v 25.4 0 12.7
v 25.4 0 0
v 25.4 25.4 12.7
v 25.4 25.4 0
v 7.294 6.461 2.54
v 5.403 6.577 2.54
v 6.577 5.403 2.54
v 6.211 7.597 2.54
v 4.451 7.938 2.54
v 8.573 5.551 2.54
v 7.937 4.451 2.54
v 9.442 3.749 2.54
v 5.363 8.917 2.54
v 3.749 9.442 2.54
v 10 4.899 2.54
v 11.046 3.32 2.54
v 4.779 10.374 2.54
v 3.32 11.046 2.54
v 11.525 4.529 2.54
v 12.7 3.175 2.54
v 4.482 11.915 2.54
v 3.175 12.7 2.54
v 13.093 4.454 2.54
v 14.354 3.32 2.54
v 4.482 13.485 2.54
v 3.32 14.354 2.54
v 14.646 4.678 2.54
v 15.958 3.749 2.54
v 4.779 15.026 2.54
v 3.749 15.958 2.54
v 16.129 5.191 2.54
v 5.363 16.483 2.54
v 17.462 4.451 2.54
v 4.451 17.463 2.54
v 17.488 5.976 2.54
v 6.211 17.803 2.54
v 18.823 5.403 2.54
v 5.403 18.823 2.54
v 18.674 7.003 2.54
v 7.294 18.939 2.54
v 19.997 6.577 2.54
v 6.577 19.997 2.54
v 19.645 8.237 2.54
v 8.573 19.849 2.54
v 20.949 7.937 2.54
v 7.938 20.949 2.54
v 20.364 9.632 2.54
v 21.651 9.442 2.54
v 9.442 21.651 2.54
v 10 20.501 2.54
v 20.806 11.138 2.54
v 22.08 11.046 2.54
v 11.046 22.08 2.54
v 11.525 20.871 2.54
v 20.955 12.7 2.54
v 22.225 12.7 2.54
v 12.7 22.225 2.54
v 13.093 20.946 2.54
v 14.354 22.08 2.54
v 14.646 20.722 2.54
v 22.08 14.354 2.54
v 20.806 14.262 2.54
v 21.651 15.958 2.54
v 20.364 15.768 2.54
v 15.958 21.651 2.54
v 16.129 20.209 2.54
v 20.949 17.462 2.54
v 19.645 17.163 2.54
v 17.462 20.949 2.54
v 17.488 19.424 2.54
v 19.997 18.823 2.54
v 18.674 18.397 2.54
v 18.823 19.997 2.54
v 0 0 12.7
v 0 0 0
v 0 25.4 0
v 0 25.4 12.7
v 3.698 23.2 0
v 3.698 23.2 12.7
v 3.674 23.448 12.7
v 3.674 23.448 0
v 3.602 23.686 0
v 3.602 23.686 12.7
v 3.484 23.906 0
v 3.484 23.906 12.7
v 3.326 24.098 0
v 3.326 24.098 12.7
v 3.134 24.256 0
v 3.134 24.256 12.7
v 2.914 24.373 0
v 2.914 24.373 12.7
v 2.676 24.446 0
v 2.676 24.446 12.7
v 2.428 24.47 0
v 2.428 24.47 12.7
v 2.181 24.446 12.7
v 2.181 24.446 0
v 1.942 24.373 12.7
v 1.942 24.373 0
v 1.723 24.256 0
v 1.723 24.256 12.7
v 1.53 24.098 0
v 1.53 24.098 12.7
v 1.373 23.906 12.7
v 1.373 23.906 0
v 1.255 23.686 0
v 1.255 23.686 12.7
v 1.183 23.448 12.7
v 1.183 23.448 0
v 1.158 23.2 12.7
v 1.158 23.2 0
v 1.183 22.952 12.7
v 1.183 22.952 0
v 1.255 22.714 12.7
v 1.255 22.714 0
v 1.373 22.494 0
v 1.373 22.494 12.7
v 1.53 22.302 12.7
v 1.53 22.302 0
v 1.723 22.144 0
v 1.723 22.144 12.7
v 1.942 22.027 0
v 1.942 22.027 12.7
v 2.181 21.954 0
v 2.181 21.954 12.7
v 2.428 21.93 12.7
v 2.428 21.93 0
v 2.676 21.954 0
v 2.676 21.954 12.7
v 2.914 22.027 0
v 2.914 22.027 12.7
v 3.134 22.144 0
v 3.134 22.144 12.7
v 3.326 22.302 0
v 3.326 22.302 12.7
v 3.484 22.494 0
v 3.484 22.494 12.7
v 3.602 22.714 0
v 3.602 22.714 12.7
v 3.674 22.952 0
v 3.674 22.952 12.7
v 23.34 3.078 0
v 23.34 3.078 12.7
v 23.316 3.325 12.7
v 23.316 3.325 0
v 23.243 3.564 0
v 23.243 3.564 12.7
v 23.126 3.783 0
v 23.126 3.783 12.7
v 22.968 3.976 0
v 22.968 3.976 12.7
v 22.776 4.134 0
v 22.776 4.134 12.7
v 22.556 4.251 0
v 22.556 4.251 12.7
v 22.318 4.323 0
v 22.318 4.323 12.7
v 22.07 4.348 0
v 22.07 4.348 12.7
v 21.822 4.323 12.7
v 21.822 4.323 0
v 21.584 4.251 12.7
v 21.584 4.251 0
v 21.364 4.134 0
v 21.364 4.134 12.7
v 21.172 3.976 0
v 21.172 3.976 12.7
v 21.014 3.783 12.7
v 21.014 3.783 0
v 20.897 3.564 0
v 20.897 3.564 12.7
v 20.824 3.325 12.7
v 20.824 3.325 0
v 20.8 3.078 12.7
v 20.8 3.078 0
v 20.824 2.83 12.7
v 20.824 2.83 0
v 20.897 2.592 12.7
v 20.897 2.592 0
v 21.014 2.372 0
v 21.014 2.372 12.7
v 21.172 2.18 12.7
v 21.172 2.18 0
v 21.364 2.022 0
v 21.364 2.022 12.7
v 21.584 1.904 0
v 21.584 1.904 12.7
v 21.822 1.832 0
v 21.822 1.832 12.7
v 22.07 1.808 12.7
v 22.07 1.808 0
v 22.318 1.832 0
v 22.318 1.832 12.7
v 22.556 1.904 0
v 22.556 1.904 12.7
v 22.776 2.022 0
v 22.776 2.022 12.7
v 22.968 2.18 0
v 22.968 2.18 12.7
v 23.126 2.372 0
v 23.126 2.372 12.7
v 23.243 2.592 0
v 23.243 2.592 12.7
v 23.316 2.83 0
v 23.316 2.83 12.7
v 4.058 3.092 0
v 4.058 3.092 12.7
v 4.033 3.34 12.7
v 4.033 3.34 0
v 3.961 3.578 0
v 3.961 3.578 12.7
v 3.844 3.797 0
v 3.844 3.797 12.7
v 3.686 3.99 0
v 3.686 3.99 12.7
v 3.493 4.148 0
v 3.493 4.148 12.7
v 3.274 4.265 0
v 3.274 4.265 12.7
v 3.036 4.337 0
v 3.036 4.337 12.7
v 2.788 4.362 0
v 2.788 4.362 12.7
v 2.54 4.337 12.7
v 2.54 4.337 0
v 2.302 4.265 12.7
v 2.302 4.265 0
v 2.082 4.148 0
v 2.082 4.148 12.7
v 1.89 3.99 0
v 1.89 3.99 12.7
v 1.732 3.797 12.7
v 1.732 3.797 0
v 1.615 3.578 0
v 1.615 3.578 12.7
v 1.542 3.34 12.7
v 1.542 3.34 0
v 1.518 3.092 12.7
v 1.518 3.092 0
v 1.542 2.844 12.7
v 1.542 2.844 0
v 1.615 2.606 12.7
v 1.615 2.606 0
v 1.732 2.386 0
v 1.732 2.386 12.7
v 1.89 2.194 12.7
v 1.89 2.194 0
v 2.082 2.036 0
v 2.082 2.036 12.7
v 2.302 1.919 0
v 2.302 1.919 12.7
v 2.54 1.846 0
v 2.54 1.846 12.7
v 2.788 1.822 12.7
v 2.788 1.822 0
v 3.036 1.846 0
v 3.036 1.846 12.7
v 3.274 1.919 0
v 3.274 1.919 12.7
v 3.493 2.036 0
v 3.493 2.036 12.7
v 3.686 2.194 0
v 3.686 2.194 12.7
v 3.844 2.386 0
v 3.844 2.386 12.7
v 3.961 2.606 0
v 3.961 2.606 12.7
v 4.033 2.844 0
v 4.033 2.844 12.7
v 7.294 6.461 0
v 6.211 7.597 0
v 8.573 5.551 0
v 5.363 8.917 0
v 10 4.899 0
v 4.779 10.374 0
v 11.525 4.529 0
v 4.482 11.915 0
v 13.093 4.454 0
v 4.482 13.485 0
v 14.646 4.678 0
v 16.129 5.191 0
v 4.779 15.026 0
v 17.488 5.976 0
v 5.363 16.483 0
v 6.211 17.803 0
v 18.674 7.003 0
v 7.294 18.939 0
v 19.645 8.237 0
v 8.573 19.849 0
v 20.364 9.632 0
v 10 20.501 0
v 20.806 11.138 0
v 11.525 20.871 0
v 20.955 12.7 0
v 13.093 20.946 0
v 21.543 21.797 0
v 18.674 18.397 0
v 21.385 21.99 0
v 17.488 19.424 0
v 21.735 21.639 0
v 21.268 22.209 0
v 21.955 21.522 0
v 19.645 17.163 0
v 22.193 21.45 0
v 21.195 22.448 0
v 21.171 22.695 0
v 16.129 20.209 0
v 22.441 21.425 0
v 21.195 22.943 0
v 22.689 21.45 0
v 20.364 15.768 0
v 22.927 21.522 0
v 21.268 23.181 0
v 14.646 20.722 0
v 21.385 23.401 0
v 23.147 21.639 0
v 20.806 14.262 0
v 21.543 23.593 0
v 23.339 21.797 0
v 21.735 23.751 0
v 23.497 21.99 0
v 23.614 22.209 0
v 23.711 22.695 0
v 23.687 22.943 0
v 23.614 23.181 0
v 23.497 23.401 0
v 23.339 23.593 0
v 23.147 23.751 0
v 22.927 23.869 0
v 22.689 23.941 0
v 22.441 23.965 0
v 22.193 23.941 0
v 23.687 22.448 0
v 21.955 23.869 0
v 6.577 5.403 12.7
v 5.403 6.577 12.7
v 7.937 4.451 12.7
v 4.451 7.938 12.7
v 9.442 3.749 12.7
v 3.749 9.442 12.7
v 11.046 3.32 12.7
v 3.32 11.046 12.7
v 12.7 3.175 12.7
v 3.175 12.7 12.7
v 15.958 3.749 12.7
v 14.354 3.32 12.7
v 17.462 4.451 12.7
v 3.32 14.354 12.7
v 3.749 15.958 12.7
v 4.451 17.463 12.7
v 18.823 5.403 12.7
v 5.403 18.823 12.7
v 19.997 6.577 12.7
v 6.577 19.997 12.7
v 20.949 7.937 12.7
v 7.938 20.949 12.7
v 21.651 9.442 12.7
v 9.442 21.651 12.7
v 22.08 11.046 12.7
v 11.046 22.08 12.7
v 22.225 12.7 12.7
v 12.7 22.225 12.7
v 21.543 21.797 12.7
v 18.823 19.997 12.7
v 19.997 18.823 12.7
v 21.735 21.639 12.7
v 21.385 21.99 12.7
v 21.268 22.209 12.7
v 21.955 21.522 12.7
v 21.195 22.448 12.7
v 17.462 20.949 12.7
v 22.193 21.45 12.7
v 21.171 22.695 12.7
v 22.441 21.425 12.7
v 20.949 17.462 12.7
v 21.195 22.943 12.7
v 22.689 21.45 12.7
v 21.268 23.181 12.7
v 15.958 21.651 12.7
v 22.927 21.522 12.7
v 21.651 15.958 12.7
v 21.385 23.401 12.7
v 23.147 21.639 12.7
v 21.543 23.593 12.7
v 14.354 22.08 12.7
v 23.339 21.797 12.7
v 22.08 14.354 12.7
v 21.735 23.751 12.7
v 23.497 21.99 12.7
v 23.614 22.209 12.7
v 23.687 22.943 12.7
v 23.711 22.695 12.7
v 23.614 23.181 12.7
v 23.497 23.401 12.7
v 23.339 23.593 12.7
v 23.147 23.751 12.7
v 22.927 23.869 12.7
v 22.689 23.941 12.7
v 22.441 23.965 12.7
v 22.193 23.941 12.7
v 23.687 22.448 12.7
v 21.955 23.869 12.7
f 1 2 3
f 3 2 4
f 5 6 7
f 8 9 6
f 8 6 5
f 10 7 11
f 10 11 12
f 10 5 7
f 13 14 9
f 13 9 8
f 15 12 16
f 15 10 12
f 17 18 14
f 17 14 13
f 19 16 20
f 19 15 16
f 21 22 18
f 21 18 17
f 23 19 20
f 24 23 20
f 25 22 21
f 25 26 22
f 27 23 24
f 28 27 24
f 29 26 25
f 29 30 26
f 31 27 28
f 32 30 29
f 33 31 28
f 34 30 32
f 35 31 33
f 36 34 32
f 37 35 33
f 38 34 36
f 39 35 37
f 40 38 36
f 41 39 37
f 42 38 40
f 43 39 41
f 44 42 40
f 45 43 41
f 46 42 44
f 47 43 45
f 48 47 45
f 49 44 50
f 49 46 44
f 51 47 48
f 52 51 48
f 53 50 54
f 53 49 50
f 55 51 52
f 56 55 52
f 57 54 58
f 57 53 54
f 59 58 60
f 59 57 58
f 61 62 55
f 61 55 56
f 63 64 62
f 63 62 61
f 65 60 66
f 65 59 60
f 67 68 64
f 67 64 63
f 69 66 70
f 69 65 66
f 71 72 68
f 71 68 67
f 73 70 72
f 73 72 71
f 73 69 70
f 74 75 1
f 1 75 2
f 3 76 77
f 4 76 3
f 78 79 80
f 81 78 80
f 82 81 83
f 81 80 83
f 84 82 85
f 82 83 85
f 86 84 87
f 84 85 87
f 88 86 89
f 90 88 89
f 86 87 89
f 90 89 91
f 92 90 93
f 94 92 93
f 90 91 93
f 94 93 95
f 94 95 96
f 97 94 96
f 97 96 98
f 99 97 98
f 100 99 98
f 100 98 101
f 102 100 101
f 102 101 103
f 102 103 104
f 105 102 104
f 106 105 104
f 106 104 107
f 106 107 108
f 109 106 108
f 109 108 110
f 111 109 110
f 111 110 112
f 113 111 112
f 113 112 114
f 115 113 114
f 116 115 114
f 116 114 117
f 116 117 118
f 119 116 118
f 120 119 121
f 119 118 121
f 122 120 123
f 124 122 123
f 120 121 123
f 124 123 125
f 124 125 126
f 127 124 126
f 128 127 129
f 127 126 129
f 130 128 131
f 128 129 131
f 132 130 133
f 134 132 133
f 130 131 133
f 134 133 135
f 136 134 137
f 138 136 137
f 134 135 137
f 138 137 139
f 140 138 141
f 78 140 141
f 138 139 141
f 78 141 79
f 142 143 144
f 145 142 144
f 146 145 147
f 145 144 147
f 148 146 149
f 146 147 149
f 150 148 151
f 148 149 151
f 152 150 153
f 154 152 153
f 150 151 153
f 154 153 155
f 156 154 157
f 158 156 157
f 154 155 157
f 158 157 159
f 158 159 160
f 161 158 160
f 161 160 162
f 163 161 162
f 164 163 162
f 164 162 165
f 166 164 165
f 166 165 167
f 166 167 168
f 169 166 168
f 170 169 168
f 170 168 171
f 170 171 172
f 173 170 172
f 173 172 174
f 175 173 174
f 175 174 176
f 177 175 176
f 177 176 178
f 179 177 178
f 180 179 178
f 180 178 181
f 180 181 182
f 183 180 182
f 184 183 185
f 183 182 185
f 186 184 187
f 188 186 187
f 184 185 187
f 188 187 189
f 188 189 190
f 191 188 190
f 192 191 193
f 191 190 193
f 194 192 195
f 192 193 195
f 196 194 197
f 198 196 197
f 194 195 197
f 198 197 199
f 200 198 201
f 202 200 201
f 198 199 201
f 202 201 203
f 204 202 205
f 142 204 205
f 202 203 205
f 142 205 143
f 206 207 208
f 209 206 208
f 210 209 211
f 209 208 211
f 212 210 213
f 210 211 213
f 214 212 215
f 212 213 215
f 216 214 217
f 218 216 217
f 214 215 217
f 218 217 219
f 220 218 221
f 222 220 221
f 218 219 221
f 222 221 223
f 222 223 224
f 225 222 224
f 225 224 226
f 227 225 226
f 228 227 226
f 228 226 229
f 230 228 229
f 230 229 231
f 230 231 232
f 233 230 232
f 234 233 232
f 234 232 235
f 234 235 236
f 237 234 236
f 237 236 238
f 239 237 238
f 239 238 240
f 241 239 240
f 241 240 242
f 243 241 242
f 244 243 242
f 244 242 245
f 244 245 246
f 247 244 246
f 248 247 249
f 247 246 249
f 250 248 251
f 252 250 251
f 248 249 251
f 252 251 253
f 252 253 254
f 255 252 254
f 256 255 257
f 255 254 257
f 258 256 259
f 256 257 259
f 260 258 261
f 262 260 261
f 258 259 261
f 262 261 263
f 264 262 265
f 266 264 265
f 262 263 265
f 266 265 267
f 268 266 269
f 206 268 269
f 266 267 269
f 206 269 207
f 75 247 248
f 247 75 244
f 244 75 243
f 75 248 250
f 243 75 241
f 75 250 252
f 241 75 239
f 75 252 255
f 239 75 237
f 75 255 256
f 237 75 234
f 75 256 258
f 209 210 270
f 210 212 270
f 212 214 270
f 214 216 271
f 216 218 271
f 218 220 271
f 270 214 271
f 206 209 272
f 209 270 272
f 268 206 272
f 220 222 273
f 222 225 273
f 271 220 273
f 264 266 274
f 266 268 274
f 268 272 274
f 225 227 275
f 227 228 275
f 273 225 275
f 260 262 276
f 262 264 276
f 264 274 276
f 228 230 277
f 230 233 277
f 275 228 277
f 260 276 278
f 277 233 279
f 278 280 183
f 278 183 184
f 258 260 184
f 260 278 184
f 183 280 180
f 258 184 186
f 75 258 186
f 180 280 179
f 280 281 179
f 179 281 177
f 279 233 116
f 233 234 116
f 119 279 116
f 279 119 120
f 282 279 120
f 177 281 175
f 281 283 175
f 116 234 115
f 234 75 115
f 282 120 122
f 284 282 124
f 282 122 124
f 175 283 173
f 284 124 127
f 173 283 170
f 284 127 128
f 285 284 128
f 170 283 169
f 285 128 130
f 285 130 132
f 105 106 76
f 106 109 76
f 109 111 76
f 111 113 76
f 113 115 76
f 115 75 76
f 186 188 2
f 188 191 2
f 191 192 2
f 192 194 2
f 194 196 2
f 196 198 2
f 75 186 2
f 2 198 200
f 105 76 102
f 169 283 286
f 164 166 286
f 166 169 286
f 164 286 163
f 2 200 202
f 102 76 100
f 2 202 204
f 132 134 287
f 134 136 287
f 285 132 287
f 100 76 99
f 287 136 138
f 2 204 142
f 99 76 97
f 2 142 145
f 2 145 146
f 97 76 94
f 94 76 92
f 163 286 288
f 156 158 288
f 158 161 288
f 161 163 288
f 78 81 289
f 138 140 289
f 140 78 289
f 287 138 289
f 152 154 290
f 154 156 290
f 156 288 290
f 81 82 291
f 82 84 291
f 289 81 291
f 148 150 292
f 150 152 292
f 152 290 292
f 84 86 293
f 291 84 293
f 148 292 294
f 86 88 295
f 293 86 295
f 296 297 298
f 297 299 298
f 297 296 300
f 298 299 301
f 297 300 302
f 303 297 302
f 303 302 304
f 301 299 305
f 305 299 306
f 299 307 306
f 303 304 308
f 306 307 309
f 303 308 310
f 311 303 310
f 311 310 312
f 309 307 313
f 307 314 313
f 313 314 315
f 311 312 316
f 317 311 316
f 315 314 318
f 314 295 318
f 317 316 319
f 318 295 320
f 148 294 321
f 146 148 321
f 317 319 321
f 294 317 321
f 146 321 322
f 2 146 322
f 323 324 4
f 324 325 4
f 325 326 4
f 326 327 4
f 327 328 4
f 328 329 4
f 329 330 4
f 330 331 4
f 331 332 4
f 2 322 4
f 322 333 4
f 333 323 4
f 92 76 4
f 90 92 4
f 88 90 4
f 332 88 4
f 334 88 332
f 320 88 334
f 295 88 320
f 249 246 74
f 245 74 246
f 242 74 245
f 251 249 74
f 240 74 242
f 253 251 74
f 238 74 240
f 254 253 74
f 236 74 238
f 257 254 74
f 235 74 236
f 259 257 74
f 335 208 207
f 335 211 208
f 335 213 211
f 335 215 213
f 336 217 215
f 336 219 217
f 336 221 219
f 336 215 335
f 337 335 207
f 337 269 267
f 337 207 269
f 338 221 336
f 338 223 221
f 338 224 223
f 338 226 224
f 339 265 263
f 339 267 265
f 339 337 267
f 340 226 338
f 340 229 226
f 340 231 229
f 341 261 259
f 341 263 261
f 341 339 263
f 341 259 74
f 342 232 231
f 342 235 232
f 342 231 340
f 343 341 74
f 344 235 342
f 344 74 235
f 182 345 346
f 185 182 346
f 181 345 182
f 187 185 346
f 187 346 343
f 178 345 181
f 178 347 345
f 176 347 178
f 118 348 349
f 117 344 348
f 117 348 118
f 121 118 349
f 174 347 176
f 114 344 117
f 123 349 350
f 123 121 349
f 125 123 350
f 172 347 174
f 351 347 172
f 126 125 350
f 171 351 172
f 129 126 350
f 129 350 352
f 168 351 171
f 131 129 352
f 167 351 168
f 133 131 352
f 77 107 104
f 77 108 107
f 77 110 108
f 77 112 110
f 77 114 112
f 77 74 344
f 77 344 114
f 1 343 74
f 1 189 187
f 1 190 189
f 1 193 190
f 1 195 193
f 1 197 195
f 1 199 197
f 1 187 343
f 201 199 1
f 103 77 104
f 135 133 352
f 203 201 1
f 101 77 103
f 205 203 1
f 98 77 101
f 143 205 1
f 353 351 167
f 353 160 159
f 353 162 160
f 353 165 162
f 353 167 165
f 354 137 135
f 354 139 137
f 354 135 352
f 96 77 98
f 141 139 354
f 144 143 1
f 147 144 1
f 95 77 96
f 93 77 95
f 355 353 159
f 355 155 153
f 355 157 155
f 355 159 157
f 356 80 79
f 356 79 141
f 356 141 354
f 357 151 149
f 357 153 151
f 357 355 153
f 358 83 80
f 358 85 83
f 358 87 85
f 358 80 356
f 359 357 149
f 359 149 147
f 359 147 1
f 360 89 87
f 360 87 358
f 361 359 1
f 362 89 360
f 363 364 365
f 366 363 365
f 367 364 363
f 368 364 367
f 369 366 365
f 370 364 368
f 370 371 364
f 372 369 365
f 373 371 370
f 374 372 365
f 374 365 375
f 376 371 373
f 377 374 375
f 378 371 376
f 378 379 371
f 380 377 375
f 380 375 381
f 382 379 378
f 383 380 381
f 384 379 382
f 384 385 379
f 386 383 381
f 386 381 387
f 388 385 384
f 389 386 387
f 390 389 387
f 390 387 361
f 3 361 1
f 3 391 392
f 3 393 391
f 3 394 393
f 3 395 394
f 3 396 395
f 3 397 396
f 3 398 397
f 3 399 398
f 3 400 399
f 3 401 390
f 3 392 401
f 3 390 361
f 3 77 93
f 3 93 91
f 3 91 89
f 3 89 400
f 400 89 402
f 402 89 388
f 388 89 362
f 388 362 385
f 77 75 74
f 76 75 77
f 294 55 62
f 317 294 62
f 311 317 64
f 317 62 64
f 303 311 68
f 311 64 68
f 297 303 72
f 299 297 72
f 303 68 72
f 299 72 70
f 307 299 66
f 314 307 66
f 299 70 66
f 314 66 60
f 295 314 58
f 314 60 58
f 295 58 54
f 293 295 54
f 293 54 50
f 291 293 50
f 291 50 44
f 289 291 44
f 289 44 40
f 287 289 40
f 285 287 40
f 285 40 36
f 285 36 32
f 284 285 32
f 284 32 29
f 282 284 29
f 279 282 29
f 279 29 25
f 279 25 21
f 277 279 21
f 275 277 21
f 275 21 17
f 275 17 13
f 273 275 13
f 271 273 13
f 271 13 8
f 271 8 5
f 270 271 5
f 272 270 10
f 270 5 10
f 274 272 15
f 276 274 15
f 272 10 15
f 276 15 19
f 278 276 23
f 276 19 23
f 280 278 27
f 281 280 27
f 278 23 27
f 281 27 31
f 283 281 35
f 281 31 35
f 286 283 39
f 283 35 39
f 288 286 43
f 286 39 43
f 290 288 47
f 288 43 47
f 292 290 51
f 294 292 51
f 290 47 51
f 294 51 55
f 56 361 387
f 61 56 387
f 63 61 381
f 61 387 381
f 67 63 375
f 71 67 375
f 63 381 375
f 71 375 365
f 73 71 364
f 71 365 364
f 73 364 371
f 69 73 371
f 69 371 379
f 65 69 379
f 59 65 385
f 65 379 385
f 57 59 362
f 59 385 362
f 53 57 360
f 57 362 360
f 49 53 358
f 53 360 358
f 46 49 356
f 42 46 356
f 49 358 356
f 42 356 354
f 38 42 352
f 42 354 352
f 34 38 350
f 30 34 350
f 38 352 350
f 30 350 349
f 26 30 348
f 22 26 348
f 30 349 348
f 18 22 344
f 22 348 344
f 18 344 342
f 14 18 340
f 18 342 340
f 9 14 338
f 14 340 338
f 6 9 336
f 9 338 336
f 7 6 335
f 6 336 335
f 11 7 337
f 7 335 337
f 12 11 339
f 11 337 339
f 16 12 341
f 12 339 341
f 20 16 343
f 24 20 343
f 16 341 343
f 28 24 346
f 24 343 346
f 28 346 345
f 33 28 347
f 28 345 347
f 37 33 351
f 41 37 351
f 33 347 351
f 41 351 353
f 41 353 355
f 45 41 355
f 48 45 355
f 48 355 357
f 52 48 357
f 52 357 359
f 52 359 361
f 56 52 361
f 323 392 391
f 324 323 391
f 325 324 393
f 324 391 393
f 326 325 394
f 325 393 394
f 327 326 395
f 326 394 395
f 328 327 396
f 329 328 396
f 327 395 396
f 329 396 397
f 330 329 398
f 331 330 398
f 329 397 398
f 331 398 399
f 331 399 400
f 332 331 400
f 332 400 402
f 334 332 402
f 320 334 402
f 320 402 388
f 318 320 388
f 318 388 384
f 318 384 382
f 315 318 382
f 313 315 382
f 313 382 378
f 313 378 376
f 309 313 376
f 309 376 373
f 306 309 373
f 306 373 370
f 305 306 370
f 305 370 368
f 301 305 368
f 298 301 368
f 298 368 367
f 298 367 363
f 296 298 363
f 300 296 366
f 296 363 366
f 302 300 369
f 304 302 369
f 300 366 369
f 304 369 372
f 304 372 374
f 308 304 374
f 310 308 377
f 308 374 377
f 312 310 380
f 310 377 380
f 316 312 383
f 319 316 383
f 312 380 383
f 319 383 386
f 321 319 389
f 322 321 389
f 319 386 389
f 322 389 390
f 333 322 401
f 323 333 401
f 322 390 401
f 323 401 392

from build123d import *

# Parameters (mm, degrees)
F0_W      = 25.4
F0_H      = 25.4
F1_DEPTH  = 12.7
F2_R      = 9.525
F3_DEPTH  = 10.16
F4_R      = 8.255
F5_DEPTH  = 2.541
F6_R      = 1.27
F7_DEPTH  = 12.701
F8_R      = 1.27
F9_DEPTH  = 12.701
F10_R     = 1.27
F11_DEPTH = 12.701
F12_R     = 1.27
F13_DEPTH = 12.701


with BuildPart() as f1:
    # F0 (on Top) → F1 (new body)
    with BuildSketch(Plane.XY):
        with Locations((12.7, 12.7)):
            Rectangle(F0_W, F0_H)
    extrude(amount=F1_DEPTH)

    # F2 (on face) → F3 (cut)
    with BuildSketch(Plane.XY.offset(12.7)):
        with Locations((12.7, 12.7)):
            Circle(F2_R)
    extrude(amount=-F3_DEPTH, mode=Mode.SUBTRACT)

    # F4 (on face) → F5 (cut, through all)
    with BuildSketch(Plane.XY.offset(2.54)):
        with Locations((12.7, 12.7)):
            Circle(F4_R)
    extrude(amount=-F5_DEPTH, mode=Mode.SUBTRACT)

    # F6 (on face) → F7 (cut, through all)
    with BuildSketch(Plane.XY.offset(12.7)):
        with Locations((2.787879, 3.091837)):
            Circle(F6_R)
    extrude(amount=-F7_DEPTH, mode=Mode.SUBTRACT)

    # F8 (on face) → F9 (cut, through all)
    with BuildSketch(Plane.XY.offset(12.7)):
        with Locations((2.428474, 23.200024)):
            Circle(F8_R)
    extrude(amount=-F9_DEPTH, mode=Mode.SUBTRACT)

    # F10 (on face) → F11 (cut, through all)
    with BuildSketch(Plane.XY.offset(12.7)):
        with Locations((22.069965, 3.077724)):
            Circle(F10_R)
    extrude(amount=-F11_DEPTH, mode=Mode.SUBTRACT)

    # F12 (on face) → F13 (cut, through all)
    with BuildSketch(Plane.XY.offset(12.7)):
        with Locations((22.441011, 22.695344)):
            Circle(F12_R)
    extrude(amount=-F13_DEPTH, mode=Mode.SUBTRACT)


solid = f1.part
